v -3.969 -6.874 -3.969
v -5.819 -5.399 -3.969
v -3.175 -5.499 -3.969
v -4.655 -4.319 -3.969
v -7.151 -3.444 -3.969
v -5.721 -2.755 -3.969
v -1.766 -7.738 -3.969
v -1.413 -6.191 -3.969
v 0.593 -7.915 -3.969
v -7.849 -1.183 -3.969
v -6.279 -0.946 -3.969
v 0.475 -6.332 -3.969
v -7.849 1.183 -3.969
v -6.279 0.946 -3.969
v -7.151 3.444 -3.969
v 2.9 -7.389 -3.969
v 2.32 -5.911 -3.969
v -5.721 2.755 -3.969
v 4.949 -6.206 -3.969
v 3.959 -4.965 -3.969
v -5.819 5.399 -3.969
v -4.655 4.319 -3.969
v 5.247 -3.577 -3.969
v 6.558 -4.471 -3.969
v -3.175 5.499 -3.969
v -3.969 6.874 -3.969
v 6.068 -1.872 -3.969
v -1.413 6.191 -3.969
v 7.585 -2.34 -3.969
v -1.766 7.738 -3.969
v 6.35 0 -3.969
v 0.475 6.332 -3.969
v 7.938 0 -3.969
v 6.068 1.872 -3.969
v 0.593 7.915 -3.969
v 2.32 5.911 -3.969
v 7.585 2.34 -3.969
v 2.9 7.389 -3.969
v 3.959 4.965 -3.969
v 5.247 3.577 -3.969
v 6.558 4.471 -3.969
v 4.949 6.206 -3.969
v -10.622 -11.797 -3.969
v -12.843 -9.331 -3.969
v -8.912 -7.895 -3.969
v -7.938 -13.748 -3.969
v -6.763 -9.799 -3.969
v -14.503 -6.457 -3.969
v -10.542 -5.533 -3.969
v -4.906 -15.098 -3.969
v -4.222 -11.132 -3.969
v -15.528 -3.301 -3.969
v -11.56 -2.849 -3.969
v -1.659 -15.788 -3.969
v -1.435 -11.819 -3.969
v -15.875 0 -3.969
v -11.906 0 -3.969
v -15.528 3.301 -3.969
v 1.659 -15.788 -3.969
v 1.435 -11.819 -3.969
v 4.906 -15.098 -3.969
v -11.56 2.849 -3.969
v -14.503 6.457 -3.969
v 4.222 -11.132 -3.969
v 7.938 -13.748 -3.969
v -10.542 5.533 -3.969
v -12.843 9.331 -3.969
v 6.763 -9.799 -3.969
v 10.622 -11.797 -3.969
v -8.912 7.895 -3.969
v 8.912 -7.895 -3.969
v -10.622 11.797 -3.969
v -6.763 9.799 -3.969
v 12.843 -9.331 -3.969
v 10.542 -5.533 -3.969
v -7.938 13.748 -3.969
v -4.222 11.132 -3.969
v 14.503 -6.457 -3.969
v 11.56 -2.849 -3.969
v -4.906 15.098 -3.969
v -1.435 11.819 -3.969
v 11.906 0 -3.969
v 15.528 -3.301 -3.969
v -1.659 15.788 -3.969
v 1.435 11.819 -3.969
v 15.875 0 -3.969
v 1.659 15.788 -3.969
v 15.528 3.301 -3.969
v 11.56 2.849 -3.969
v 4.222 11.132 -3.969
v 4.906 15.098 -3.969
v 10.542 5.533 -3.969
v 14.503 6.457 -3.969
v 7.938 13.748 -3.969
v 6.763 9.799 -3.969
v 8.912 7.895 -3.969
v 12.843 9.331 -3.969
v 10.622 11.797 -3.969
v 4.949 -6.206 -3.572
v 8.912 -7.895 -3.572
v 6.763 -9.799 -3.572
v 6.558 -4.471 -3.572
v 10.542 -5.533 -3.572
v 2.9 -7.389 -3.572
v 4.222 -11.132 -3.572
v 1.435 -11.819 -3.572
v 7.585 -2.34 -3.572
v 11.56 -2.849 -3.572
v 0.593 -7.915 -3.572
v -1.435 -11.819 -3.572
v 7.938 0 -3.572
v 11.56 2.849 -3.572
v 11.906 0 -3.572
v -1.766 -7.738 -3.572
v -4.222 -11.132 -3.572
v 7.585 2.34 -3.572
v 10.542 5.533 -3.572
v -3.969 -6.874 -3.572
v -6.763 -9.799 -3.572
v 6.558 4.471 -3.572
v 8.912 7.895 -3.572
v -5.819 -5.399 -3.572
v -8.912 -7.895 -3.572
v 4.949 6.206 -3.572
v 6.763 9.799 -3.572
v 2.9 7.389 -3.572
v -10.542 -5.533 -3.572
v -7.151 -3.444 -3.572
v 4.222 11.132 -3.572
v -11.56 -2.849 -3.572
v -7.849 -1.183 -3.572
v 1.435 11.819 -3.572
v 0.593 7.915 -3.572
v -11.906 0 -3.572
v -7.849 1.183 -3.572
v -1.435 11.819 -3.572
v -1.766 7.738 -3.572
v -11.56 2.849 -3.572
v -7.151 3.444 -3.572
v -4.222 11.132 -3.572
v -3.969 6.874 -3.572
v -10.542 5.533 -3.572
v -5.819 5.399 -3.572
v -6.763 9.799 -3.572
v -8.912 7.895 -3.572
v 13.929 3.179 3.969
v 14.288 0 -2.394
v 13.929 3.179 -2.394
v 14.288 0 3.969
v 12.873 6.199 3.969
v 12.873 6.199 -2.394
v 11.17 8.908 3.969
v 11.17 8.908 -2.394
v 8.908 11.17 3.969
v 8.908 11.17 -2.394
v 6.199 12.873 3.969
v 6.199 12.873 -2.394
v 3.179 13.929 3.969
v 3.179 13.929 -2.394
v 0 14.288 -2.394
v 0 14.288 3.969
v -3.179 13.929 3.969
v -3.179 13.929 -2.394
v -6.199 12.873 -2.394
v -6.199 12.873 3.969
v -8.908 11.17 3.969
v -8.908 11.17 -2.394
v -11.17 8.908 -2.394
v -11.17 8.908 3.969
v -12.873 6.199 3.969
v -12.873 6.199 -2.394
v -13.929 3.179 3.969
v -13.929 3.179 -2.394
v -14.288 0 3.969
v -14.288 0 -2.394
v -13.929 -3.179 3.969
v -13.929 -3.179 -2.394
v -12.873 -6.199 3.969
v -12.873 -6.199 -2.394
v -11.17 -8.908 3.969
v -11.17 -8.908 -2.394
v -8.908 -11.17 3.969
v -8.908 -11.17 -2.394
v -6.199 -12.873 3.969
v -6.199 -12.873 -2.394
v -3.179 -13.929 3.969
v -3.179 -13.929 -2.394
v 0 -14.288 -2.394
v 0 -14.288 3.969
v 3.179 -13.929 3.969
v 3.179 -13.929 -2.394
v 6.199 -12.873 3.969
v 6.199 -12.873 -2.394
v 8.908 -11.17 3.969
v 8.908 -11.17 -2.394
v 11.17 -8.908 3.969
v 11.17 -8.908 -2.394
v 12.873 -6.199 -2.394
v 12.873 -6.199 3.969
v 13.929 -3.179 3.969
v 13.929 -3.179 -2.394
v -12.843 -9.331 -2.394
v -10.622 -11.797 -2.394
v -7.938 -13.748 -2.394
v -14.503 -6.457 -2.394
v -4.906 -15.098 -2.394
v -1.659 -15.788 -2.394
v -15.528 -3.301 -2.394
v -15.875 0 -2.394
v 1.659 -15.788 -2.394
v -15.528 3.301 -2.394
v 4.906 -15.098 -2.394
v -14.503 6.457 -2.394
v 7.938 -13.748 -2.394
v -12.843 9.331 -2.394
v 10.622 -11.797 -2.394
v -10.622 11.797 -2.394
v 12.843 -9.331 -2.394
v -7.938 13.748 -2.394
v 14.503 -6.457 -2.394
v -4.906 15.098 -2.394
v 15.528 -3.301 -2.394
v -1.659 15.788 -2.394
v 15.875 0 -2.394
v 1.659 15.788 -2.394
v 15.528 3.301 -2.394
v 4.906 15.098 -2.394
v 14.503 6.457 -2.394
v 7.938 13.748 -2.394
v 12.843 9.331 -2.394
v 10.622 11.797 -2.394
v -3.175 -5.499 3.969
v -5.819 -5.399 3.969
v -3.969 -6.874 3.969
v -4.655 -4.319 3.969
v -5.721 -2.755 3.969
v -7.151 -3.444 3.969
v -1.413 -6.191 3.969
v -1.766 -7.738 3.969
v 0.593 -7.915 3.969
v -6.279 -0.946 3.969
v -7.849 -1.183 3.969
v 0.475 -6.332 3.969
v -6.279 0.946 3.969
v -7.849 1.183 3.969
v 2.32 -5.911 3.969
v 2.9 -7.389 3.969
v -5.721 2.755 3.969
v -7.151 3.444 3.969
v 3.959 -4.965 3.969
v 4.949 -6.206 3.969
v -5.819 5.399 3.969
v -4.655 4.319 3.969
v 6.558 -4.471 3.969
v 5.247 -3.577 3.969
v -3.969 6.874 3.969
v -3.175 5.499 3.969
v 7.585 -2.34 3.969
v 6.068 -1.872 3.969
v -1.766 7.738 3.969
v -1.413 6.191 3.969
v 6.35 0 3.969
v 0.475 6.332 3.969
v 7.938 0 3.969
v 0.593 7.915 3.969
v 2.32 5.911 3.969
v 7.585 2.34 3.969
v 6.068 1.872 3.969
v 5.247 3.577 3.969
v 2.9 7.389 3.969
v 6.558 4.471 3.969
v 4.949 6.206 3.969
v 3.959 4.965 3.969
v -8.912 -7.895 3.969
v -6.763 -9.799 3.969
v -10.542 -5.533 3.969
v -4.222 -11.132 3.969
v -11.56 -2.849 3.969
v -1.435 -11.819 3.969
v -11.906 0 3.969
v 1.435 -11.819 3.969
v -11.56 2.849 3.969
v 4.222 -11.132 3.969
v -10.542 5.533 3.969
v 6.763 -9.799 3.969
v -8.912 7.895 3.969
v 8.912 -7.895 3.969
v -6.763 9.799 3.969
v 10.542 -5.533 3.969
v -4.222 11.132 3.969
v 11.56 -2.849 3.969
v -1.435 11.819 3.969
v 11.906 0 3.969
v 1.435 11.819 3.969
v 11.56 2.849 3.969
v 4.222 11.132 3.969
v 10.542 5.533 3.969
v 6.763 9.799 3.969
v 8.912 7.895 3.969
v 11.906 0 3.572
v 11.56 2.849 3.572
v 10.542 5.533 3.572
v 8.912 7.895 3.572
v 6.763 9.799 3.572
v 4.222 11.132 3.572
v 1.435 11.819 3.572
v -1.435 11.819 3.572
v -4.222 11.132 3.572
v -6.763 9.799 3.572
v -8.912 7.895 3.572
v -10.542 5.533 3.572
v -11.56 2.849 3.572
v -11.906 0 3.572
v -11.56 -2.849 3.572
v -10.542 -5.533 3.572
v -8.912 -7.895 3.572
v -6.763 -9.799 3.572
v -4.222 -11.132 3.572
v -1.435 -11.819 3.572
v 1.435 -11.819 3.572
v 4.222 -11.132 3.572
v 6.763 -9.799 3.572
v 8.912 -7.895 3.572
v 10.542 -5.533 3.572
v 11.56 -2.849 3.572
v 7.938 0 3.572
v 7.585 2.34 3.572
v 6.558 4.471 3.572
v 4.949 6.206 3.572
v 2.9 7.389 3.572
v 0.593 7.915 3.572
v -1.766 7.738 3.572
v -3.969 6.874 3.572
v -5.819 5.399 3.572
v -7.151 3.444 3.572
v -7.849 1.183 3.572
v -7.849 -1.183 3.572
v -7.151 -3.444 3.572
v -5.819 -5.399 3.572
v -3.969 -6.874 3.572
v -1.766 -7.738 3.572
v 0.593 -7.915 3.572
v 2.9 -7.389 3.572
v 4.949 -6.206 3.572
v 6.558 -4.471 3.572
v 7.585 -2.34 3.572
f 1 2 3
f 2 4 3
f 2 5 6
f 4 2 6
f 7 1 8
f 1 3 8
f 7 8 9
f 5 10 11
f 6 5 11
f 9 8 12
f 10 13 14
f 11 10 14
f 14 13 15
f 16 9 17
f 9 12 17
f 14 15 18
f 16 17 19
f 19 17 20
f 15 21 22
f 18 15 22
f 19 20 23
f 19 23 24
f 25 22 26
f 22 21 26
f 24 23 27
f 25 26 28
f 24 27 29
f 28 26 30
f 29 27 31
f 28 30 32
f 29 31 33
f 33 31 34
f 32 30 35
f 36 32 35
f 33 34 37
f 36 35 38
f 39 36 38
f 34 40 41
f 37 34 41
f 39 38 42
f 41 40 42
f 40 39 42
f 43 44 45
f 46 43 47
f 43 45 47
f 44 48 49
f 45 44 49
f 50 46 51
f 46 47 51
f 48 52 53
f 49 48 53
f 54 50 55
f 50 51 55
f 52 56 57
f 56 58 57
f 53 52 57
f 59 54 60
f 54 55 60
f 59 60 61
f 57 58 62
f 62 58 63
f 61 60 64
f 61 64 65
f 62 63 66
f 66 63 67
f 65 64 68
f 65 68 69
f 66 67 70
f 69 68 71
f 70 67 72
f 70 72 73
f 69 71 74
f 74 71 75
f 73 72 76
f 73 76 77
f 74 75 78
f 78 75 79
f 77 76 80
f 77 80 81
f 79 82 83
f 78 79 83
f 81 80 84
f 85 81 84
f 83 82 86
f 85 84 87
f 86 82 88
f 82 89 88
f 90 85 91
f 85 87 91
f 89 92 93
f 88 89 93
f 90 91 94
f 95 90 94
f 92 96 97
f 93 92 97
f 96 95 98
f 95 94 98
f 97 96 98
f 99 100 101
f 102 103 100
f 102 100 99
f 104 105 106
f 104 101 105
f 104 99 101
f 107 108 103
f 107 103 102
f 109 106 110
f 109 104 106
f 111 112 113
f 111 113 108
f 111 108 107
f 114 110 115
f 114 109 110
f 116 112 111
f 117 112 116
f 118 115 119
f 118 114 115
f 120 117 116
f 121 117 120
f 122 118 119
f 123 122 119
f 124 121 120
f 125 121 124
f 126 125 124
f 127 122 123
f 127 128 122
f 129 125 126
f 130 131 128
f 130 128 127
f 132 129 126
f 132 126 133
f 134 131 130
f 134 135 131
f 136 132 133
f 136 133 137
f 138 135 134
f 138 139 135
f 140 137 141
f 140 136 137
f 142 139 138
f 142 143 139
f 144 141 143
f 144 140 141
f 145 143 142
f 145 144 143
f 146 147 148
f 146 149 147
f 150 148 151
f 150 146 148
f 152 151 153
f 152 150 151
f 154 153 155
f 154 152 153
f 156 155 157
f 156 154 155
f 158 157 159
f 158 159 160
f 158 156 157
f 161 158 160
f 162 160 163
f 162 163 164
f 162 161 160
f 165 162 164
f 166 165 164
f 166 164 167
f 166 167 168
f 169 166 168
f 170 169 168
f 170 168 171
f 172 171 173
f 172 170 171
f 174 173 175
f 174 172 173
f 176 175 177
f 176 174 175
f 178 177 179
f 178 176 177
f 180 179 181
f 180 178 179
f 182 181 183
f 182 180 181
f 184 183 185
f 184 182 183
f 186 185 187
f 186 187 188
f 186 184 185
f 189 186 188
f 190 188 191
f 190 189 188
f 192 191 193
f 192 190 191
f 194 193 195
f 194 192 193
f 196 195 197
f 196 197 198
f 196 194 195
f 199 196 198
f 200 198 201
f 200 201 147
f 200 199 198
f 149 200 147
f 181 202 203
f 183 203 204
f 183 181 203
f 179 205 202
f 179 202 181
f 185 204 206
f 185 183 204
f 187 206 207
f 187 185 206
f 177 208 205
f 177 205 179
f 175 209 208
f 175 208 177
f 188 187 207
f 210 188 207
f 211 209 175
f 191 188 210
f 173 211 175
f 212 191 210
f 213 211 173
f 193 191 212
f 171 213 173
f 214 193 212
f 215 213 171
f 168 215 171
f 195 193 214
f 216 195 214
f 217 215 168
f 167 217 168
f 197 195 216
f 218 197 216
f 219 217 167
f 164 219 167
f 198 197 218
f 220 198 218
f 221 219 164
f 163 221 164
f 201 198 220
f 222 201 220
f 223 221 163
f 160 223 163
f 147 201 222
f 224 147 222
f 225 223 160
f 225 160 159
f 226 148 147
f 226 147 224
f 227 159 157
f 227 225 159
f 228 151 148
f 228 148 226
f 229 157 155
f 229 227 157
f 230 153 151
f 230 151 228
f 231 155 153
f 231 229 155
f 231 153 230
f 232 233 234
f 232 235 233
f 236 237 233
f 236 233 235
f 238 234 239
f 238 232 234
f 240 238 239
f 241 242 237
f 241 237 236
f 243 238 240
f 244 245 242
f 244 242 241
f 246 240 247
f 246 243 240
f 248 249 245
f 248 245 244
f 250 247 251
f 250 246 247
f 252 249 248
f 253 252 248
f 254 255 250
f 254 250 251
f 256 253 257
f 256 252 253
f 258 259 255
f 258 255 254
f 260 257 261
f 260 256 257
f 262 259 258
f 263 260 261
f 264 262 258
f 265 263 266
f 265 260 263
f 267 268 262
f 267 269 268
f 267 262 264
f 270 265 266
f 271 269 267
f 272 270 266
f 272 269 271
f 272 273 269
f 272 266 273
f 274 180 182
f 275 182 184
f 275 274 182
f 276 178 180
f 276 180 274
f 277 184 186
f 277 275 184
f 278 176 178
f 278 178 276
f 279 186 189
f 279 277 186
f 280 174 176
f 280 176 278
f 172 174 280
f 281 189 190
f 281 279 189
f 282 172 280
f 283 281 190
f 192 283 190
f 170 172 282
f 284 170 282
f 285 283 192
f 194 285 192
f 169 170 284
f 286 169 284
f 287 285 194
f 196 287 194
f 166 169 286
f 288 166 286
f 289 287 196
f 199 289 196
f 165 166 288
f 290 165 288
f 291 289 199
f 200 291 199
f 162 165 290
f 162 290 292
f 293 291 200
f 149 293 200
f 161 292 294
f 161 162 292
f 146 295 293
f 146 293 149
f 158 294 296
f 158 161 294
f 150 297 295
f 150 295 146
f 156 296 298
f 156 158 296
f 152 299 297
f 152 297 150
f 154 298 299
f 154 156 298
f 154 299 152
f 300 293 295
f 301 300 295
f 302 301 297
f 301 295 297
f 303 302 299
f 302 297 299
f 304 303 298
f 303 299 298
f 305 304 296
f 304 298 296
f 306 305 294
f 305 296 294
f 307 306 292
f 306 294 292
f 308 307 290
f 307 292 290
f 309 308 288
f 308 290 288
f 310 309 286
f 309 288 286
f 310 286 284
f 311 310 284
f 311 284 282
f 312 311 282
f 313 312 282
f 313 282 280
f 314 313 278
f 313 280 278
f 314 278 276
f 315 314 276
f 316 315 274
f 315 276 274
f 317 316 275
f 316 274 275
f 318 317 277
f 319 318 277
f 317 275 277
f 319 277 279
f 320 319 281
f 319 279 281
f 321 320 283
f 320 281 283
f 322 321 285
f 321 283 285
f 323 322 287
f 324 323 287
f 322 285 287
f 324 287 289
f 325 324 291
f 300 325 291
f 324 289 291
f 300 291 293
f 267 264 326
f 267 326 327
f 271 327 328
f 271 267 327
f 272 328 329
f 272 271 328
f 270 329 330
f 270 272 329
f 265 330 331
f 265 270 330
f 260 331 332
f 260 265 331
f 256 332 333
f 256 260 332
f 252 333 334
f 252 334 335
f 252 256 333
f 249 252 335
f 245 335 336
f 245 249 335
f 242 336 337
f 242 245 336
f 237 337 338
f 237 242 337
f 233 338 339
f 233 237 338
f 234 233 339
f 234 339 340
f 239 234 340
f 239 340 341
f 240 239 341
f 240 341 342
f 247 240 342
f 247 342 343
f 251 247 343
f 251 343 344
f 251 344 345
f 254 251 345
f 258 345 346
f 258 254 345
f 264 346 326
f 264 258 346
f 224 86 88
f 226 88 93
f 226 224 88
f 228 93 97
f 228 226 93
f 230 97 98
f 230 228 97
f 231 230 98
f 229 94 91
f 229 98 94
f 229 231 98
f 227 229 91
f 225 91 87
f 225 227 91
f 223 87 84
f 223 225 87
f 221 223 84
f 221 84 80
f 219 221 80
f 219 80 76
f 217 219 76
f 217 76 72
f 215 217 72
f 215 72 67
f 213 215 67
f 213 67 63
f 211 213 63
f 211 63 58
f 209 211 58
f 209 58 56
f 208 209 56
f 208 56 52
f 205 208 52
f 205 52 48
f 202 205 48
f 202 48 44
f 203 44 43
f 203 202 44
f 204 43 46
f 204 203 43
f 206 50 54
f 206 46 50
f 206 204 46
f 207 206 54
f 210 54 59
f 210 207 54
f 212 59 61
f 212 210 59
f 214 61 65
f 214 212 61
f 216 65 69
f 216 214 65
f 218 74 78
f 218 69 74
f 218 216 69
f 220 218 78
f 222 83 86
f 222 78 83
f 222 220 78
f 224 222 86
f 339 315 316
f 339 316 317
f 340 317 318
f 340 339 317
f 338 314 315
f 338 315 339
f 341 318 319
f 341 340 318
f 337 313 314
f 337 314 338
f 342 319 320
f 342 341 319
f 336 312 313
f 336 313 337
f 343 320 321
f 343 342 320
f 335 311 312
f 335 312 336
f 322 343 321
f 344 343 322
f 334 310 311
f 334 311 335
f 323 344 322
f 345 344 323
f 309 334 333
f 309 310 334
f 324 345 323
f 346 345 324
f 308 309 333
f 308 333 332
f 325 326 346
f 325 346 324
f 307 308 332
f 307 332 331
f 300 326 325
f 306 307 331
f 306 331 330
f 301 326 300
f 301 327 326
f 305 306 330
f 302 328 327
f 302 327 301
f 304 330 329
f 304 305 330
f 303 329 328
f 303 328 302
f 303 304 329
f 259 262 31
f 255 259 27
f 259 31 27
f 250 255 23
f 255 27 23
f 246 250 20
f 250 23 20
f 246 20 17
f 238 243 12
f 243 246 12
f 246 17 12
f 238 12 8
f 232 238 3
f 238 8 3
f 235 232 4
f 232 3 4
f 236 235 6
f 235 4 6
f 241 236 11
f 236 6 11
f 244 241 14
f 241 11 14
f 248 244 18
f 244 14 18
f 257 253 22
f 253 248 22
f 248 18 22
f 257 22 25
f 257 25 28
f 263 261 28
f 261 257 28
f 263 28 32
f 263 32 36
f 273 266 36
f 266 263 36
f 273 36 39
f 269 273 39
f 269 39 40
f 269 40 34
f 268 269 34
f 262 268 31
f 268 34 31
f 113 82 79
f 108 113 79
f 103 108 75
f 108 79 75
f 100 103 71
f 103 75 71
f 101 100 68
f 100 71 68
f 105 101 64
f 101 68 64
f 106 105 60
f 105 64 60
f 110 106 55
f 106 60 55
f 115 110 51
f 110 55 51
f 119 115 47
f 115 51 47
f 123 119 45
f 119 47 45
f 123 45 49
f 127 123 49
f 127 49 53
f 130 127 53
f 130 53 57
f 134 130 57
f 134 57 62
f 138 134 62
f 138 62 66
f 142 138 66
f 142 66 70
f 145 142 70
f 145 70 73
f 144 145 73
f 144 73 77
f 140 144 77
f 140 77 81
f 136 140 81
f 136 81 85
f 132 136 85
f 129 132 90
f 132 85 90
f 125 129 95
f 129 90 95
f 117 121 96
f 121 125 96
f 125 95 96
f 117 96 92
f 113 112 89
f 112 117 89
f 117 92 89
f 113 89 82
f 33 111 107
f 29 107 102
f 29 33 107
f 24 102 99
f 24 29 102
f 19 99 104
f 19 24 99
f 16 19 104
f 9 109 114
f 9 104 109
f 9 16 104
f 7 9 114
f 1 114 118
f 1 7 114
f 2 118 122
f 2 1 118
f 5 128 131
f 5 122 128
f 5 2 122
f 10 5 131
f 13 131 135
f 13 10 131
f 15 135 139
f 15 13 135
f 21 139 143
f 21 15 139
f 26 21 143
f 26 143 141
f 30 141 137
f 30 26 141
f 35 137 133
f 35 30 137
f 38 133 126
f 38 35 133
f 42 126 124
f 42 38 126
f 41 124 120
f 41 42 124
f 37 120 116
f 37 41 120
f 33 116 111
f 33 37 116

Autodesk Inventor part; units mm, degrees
ref_plane "YZ Plane" through (0, 0, 0) normal (1, 0, 0) x (0, 1, 0)
ref_plane "XZ Plane" through (0, 0, 0) normal (0, 1, 0) x (-1, 0, 0)
ref_plane "XY Plane" through (0, 0, 0) normal (0, 0, 1) x (1, 0, 0)
sketch "Sketch1" plane through (0, 0, 0) normal (0, 0, 1) x (1, 0, 0)
  line L0 (-22.225, 0) -> (22.225, 0) projected
  line L1 (0, -22.225) -> (0, 22.225) projected
  circle A0 centre (0, 0) radius 15.875
  circle A1 centre (0, 0) radius 6.35
  dimension "d0" = 12.7
  dimension "d1" = 31.75
extrude "Base" add sketch "Sketch1" along normal mid plane 7.9375 contours A1 L1 A0 L0 | L0 A0 L1 A1 | A1 L0 A0 L1 | L1 A0 L0 A1
sketch "Sketch2" plane through (0, 0, 3.9688) normal (0, 0, 1) x (1, 0, 0)
  circle A0 centre (0, 0) radius 15.875 projected
  circle A1 centre (0, 0) radius 14.2875
  dimension "d4" = 28.575
extrude "Flange Cutaway" cut sketch "Sketch2" against normal blind 6.3627
sketch "Sketch3" plane through (0, 0, 3.9688) normal (0, 0, 1) x (1, 0, 0)
  circle A0 centre (0, 0) radius 14.2875 projected
  circle A1 centre (0, 0) radius 6.35 projected
  circle A2 centre (0, 0) radius 7.9375
  circle A3 centre (0, 0) radius 11.9062
  dimension "d7" = 1.5875
  dimension "d8" = 2.3813
extrude "Cutaway" cut sketch "Sketch3" against normal blind 0.3969 contours A3
mirror "Mirror1" about plane through (0, 0, 0) normal (0, 0, 1) of "Cutaway"
properties part number "bearing_1.125OD" material "Steel"
